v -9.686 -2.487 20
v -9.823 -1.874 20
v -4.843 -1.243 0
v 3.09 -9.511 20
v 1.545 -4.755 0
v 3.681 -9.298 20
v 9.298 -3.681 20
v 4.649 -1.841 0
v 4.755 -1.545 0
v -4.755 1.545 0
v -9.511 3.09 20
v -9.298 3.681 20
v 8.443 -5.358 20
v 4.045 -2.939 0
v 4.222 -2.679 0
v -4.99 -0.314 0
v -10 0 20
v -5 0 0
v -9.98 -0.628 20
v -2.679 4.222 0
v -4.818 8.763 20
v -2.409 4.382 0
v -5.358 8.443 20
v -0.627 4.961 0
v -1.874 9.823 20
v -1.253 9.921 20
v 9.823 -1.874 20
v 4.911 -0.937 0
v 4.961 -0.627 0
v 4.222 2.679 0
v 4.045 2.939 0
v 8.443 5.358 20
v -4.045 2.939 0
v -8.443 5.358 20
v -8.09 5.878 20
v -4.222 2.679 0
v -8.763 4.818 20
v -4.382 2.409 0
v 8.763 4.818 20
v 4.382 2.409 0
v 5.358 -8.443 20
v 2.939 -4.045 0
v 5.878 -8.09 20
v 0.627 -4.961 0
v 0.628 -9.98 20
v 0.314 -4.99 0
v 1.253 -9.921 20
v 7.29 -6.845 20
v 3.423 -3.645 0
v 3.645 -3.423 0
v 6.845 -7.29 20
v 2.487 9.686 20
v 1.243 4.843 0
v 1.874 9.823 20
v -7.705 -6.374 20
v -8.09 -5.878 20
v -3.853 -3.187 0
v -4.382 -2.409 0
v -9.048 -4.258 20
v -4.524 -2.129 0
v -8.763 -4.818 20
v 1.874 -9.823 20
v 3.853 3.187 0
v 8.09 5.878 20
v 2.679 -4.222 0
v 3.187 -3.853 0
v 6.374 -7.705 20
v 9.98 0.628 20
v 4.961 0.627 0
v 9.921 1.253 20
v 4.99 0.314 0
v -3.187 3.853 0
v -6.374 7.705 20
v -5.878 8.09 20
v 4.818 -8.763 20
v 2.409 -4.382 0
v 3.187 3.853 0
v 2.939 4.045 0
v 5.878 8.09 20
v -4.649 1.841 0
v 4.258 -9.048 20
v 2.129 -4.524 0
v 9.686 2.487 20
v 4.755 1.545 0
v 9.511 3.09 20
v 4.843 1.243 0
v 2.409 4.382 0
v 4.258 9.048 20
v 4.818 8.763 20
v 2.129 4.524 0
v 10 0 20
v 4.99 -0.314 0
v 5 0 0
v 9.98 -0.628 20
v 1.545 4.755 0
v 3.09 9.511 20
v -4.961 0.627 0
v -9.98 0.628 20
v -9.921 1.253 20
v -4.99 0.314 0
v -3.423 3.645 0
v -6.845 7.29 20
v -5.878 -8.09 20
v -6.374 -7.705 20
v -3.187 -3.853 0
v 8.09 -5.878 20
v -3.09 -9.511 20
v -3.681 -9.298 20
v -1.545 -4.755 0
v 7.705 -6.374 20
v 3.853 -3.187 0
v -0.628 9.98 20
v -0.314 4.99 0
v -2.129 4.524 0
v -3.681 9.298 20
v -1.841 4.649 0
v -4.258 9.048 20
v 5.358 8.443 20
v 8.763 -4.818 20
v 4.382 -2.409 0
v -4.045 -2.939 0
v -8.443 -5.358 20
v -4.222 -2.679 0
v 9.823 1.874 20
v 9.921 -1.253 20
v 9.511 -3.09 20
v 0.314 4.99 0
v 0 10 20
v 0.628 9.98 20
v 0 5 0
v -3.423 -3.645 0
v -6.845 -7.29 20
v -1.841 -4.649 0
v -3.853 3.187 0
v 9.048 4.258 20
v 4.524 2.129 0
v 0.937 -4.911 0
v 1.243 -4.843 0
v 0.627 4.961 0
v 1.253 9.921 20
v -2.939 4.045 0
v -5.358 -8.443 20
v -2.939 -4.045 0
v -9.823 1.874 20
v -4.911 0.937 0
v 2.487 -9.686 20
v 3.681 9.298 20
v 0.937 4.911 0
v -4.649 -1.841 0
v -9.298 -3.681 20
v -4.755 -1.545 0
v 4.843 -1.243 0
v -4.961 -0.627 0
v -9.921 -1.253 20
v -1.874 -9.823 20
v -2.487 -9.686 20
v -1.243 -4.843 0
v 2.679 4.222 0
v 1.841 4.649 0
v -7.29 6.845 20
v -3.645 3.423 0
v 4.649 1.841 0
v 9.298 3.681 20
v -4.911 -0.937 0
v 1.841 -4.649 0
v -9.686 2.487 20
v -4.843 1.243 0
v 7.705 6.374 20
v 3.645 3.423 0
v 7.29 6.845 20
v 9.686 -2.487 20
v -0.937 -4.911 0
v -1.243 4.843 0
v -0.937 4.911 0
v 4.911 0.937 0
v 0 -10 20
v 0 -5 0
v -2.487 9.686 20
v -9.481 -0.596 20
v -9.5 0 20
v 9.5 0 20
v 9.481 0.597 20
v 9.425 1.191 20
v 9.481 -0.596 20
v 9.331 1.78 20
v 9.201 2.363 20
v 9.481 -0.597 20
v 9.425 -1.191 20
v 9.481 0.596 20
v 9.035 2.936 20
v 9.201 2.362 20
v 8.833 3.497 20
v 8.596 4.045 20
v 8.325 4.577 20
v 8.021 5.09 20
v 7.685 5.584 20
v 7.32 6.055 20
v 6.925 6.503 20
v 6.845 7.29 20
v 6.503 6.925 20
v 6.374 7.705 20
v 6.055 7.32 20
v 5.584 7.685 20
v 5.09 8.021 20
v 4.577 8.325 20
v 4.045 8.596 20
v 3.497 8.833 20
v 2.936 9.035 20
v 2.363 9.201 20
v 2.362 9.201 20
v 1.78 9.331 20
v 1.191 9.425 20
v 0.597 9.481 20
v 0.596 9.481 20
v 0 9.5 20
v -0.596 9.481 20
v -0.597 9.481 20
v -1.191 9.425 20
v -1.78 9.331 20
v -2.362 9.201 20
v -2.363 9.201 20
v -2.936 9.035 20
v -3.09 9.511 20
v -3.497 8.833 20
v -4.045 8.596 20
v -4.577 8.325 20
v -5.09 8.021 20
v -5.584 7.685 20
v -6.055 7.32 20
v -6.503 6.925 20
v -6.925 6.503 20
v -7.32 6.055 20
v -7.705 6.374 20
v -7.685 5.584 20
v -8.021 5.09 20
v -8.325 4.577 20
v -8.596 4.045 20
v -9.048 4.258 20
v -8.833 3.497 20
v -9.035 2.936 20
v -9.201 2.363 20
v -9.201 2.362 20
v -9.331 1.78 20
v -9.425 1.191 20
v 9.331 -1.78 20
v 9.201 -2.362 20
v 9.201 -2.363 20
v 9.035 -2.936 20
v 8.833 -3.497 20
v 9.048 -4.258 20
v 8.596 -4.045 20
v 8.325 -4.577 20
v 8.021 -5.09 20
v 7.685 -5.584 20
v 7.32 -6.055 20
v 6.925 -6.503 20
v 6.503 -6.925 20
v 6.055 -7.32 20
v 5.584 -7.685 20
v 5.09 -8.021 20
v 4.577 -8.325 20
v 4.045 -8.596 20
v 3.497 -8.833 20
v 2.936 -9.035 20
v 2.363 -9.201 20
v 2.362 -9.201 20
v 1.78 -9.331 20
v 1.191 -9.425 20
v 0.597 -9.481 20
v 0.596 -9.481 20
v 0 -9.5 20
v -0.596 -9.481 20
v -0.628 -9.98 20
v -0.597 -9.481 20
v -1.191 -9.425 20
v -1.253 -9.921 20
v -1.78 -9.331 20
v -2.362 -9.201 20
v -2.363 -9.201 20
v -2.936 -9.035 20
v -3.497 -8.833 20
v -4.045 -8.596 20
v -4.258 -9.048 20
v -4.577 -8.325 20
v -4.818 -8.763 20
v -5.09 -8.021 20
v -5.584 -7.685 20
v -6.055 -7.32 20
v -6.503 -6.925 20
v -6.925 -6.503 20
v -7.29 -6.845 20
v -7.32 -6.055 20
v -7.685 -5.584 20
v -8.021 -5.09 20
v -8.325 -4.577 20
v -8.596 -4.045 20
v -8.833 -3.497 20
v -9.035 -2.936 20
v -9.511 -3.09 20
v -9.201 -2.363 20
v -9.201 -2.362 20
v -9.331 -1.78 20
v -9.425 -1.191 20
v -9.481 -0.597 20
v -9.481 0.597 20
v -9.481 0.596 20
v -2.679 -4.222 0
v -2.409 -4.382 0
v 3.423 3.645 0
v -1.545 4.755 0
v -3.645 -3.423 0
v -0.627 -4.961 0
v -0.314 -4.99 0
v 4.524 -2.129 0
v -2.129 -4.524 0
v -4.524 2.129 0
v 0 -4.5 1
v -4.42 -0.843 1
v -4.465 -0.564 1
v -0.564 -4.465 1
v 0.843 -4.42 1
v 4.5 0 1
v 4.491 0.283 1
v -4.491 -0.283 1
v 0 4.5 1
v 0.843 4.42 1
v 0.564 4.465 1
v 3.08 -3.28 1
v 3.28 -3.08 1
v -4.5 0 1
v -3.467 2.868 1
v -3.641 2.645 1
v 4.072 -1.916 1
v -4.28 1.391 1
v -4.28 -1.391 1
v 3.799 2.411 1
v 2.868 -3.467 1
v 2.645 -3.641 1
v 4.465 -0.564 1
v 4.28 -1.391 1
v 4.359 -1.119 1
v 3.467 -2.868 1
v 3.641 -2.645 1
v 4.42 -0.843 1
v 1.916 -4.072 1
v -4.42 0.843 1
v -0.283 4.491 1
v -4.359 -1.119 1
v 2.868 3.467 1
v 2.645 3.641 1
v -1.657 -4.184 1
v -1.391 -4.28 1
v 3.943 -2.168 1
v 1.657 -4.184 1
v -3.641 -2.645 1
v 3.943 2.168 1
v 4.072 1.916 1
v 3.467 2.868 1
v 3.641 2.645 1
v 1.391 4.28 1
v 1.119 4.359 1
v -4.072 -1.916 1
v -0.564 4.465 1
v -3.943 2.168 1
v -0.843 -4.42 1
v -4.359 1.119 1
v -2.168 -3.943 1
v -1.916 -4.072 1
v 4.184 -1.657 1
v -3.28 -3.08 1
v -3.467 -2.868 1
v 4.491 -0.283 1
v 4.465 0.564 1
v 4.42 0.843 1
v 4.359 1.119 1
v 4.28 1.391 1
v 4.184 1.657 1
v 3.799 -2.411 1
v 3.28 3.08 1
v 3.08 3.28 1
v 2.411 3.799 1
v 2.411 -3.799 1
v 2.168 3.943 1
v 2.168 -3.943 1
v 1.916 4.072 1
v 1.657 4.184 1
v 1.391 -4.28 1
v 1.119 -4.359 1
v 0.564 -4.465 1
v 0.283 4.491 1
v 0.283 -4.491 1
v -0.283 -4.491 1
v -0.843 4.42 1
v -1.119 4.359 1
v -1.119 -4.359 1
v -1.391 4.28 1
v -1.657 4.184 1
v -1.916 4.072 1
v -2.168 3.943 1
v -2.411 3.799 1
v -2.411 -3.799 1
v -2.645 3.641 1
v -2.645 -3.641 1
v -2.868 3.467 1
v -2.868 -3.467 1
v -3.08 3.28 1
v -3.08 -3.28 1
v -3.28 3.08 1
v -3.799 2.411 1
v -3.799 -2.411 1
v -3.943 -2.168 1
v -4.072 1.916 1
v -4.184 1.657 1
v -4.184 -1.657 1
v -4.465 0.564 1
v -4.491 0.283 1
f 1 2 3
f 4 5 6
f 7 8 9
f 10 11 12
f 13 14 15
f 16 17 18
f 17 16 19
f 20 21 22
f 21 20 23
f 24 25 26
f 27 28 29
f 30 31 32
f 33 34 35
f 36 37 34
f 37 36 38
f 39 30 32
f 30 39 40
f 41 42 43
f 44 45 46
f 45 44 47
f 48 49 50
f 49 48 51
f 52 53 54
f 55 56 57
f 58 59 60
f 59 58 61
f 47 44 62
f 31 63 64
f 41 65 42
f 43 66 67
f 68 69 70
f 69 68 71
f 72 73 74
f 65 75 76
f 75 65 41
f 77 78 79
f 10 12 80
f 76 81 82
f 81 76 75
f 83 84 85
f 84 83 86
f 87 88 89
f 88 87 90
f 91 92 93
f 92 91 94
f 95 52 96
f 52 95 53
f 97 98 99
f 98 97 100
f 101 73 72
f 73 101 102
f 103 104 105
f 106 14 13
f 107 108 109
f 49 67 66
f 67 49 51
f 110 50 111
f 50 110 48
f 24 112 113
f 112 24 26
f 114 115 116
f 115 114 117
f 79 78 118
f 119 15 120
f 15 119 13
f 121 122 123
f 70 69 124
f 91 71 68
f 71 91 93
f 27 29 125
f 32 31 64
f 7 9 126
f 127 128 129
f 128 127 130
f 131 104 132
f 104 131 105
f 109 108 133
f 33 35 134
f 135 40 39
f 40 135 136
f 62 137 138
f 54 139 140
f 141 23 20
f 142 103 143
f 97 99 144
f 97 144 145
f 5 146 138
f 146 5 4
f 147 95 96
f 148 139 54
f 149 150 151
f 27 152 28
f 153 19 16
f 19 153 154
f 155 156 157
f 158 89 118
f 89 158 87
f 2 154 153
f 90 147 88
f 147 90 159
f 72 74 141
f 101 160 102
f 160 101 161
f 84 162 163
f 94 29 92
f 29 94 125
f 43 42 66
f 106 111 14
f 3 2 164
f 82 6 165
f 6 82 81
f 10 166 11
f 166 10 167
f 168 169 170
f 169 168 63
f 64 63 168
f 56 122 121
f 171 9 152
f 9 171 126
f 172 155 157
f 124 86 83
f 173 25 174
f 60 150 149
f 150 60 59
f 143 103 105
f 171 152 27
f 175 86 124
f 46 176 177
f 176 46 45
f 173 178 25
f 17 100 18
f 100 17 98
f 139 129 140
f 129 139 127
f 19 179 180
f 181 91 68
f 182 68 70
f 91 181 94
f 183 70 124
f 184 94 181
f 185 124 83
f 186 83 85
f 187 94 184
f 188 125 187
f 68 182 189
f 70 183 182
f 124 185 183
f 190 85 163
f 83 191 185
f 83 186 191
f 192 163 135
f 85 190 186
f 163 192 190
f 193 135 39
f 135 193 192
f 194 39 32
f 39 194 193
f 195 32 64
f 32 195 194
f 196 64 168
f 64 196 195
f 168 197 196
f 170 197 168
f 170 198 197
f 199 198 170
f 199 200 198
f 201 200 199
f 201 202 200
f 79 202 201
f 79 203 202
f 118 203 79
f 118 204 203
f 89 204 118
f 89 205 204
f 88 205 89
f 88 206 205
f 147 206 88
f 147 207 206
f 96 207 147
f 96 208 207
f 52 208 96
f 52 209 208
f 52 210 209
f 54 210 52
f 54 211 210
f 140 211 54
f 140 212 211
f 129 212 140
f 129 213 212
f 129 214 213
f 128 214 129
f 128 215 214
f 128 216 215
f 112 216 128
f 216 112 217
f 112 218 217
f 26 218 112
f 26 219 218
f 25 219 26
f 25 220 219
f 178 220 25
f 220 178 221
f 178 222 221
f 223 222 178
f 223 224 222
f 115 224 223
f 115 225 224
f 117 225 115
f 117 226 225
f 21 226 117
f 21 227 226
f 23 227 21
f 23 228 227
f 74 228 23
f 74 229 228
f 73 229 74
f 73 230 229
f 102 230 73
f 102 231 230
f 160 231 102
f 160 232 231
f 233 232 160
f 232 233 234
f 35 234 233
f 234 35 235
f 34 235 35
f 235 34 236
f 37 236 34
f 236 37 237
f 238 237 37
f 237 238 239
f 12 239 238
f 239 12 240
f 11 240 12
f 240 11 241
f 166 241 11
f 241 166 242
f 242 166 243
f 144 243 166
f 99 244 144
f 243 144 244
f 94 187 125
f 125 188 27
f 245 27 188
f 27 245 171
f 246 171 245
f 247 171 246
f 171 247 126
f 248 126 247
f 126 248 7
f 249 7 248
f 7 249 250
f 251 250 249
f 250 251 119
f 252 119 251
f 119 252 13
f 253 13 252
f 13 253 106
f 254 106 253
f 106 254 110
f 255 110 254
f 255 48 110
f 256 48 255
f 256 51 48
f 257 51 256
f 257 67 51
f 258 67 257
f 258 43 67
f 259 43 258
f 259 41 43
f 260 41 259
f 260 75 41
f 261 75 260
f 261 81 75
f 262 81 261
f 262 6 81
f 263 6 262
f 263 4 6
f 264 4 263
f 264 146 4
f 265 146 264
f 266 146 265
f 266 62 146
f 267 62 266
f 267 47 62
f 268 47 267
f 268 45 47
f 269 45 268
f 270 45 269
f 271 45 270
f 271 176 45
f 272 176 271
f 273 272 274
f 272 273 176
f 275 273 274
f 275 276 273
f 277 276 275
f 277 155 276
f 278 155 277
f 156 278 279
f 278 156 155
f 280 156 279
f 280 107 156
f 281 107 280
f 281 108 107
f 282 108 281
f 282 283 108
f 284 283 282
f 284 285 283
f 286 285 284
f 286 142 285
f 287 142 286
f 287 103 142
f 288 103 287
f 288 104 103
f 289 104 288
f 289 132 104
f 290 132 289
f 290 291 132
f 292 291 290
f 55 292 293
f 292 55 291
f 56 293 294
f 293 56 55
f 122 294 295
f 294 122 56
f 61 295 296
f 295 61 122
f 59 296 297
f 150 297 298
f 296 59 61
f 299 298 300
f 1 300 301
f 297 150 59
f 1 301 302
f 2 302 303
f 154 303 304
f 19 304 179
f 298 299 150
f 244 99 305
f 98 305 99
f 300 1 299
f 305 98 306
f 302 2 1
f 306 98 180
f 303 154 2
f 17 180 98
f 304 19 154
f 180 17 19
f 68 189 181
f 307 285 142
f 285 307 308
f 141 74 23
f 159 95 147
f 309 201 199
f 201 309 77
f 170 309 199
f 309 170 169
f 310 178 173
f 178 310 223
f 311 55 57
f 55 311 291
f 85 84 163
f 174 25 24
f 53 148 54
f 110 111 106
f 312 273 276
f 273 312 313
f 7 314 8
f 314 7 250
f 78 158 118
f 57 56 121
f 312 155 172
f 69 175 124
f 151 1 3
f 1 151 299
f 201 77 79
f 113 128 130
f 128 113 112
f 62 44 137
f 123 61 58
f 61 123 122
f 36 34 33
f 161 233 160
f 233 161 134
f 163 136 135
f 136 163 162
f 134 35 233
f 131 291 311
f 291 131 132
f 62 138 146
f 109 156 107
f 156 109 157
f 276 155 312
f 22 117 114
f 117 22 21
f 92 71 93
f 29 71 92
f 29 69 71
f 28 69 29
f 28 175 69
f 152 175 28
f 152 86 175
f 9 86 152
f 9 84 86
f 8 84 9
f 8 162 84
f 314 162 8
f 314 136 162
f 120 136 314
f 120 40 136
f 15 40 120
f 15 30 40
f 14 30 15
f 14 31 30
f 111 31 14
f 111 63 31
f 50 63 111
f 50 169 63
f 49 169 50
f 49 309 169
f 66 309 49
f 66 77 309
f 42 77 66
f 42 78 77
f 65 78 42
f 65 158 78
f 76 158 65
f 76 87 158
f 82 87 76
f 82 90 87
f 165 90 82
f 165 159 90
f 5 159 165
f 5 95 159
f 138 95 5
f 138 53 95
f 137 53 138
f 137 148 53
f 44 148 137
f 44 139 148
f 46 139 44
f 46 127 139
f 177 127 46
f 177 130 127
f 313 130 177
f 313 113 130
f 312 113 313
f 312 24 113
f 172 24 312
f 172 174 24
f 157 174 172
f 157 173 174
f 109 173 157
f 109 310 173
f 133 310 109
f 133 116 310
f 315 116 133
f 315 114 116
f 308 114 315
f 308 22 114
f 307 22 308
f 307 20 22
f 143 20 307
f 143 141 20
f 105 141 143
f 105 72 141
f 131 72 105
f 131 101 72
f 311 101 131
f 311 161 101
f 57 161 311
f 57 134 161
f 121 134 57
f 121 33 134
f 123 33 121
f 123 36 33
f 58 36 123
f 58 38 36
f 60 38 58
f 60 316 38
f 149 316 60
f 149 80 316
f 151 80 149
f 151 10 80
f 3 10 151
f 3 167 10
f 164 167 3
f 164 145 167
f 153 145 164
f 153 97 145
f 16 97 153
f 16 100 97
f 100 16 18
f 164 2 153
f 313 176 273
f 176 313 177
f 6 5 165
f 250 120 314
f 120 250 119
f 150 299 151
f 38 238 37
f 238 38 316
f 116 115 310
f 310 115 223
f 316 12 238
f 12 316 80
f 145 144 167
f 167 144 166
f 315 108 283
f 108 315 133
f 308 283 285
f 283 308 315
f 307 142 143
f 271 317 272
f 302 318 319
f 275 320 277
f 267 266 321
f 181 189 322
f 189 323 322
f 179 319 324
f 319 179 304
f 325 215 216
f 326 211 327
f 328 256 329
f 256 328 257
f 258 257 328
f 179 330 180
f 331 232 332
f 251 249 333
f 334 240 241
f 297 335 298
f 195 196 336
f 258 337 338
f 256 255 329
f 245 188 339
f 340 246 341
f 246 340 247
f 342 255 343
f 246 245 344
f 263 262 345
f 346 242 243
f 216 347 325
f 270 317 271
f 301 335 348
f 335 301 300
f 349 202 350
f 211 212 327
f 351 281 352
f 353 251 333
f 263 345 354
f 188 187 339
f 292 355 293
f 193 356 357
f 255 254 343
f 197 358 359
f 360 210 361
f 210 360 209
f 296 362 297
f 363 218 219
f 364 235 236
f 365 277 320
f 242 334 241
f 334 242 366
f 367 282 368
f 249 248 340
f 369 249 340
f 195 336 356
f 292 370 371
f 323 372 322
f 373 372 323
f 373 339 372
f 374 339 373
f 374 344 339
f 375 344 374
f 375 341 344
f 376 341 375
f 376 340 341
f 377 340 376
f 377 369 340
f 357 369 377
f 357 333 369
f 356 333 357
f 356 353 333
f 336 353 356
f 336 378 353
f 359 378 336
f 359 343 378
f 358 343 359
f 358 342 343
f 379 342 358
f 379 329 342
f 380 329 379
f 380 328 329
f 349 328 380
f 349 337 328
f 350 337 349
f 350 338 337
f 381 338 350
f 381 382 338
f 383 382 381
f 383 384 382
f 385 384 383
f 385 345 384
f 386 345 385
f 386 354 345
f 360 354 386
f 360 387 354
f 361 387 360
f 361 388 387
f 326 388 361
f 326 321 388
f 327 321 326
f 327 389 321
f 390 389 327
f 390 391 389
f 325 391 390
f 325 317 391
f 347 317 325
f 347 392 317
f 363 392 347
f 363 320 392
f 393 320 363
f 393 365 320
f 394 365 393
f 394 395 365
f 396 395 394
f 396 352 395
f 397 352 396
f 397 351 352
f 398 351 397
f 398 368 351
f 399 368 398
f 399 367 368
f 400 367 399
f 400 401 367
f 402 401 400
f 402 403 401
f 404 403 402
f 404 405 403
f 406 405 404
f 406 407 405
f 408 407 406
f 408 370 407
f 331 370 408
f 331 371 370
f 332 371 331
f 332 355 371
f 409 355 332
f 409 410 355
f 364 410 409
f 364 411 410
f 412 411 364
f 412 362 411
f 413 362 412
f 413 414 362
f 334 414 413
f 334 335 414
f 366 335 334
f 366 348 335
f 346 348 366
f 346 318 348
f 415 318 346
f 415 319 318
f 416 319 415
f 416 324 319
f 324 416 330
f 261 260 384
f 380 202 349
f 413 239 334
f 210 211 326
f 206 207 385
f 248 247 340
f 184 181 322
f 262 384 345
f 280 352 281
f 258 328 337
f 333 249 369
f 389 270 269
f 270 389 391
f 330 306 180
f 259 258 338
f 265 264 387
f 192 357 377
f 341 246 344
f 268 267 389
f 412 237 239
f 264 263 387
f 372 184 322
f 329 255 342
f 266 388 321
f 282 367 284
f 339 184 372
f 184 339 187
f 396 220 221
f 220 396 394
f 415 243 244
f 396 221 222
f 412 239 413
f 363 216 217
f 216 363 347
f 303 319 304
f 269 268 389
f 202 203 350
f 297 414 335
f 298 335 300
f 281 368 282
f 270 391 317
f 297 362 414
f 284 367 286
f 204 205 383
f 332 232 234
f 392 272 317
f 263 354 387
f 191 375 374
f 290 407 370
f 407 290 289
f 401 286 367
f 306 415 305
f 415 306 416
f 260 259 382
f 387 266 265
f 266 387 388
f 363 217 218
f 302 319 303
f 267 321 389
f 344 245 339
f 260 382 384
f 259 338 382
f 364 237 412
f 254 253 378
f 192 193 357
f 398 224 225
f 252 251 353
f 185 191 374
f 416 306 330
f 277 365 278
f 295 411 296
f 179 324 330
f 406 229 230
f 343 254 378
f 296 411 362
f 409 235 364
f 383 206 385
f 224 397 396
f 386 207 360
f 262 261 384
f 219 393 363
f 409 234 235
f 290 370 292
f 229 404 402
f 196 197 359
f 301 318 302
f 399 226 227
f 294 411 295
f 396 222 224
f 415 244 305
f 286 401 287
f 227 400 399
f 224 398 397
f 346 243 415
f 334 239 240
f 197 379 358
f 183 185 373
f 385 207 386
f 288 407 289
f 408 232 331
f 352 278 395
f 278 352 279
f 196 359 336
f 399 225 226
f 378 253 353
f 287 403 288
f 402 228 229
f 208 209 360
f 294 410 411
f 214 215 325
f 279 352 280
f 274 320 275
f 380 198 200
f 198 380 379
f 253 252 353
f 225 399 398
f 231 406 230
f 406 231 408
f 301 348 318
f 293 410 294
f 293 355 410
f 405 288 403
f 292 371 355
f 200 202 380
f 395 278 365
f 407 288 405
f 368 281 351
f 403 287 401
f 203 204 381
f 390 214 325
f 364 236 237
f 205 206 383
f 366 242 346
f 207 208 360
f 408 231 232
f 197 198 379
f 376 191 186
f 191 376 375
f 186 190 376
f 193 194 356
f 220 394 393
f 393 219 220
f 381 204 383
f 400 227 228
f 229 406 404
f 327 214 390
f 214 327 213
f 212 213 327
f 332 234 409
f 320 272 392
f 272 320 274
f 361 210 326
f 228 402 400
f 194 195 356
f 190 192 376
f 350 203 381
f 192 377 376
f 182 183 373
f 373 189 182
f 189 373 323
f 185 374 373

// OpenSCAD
                         // Loguncov Maxim \\
//-------------------------------------------------------------------\\



$fn=100;


glass(up = 10, down = 5, height = 20, wall = 0.5, bottom = 1); //Стакан

//glass(up = 15, down = 7, height = 39, wall = 0.5, bottom = 1); //Вазочка

//glass(up = 25, down = 10, height = 100, wall = 0.5, bottom = 1); //Ваза



module glass(up, down, height, wall, bottom) {
	difference() {
		translate([0,0,0]) 
		cylinder(h = height, r1 = down, r2 = up);
		translate([0,0,1])
		cylinder(h = height+0.001-bottom, r1 = down-wall, r2 = up-wall);
	}
}
